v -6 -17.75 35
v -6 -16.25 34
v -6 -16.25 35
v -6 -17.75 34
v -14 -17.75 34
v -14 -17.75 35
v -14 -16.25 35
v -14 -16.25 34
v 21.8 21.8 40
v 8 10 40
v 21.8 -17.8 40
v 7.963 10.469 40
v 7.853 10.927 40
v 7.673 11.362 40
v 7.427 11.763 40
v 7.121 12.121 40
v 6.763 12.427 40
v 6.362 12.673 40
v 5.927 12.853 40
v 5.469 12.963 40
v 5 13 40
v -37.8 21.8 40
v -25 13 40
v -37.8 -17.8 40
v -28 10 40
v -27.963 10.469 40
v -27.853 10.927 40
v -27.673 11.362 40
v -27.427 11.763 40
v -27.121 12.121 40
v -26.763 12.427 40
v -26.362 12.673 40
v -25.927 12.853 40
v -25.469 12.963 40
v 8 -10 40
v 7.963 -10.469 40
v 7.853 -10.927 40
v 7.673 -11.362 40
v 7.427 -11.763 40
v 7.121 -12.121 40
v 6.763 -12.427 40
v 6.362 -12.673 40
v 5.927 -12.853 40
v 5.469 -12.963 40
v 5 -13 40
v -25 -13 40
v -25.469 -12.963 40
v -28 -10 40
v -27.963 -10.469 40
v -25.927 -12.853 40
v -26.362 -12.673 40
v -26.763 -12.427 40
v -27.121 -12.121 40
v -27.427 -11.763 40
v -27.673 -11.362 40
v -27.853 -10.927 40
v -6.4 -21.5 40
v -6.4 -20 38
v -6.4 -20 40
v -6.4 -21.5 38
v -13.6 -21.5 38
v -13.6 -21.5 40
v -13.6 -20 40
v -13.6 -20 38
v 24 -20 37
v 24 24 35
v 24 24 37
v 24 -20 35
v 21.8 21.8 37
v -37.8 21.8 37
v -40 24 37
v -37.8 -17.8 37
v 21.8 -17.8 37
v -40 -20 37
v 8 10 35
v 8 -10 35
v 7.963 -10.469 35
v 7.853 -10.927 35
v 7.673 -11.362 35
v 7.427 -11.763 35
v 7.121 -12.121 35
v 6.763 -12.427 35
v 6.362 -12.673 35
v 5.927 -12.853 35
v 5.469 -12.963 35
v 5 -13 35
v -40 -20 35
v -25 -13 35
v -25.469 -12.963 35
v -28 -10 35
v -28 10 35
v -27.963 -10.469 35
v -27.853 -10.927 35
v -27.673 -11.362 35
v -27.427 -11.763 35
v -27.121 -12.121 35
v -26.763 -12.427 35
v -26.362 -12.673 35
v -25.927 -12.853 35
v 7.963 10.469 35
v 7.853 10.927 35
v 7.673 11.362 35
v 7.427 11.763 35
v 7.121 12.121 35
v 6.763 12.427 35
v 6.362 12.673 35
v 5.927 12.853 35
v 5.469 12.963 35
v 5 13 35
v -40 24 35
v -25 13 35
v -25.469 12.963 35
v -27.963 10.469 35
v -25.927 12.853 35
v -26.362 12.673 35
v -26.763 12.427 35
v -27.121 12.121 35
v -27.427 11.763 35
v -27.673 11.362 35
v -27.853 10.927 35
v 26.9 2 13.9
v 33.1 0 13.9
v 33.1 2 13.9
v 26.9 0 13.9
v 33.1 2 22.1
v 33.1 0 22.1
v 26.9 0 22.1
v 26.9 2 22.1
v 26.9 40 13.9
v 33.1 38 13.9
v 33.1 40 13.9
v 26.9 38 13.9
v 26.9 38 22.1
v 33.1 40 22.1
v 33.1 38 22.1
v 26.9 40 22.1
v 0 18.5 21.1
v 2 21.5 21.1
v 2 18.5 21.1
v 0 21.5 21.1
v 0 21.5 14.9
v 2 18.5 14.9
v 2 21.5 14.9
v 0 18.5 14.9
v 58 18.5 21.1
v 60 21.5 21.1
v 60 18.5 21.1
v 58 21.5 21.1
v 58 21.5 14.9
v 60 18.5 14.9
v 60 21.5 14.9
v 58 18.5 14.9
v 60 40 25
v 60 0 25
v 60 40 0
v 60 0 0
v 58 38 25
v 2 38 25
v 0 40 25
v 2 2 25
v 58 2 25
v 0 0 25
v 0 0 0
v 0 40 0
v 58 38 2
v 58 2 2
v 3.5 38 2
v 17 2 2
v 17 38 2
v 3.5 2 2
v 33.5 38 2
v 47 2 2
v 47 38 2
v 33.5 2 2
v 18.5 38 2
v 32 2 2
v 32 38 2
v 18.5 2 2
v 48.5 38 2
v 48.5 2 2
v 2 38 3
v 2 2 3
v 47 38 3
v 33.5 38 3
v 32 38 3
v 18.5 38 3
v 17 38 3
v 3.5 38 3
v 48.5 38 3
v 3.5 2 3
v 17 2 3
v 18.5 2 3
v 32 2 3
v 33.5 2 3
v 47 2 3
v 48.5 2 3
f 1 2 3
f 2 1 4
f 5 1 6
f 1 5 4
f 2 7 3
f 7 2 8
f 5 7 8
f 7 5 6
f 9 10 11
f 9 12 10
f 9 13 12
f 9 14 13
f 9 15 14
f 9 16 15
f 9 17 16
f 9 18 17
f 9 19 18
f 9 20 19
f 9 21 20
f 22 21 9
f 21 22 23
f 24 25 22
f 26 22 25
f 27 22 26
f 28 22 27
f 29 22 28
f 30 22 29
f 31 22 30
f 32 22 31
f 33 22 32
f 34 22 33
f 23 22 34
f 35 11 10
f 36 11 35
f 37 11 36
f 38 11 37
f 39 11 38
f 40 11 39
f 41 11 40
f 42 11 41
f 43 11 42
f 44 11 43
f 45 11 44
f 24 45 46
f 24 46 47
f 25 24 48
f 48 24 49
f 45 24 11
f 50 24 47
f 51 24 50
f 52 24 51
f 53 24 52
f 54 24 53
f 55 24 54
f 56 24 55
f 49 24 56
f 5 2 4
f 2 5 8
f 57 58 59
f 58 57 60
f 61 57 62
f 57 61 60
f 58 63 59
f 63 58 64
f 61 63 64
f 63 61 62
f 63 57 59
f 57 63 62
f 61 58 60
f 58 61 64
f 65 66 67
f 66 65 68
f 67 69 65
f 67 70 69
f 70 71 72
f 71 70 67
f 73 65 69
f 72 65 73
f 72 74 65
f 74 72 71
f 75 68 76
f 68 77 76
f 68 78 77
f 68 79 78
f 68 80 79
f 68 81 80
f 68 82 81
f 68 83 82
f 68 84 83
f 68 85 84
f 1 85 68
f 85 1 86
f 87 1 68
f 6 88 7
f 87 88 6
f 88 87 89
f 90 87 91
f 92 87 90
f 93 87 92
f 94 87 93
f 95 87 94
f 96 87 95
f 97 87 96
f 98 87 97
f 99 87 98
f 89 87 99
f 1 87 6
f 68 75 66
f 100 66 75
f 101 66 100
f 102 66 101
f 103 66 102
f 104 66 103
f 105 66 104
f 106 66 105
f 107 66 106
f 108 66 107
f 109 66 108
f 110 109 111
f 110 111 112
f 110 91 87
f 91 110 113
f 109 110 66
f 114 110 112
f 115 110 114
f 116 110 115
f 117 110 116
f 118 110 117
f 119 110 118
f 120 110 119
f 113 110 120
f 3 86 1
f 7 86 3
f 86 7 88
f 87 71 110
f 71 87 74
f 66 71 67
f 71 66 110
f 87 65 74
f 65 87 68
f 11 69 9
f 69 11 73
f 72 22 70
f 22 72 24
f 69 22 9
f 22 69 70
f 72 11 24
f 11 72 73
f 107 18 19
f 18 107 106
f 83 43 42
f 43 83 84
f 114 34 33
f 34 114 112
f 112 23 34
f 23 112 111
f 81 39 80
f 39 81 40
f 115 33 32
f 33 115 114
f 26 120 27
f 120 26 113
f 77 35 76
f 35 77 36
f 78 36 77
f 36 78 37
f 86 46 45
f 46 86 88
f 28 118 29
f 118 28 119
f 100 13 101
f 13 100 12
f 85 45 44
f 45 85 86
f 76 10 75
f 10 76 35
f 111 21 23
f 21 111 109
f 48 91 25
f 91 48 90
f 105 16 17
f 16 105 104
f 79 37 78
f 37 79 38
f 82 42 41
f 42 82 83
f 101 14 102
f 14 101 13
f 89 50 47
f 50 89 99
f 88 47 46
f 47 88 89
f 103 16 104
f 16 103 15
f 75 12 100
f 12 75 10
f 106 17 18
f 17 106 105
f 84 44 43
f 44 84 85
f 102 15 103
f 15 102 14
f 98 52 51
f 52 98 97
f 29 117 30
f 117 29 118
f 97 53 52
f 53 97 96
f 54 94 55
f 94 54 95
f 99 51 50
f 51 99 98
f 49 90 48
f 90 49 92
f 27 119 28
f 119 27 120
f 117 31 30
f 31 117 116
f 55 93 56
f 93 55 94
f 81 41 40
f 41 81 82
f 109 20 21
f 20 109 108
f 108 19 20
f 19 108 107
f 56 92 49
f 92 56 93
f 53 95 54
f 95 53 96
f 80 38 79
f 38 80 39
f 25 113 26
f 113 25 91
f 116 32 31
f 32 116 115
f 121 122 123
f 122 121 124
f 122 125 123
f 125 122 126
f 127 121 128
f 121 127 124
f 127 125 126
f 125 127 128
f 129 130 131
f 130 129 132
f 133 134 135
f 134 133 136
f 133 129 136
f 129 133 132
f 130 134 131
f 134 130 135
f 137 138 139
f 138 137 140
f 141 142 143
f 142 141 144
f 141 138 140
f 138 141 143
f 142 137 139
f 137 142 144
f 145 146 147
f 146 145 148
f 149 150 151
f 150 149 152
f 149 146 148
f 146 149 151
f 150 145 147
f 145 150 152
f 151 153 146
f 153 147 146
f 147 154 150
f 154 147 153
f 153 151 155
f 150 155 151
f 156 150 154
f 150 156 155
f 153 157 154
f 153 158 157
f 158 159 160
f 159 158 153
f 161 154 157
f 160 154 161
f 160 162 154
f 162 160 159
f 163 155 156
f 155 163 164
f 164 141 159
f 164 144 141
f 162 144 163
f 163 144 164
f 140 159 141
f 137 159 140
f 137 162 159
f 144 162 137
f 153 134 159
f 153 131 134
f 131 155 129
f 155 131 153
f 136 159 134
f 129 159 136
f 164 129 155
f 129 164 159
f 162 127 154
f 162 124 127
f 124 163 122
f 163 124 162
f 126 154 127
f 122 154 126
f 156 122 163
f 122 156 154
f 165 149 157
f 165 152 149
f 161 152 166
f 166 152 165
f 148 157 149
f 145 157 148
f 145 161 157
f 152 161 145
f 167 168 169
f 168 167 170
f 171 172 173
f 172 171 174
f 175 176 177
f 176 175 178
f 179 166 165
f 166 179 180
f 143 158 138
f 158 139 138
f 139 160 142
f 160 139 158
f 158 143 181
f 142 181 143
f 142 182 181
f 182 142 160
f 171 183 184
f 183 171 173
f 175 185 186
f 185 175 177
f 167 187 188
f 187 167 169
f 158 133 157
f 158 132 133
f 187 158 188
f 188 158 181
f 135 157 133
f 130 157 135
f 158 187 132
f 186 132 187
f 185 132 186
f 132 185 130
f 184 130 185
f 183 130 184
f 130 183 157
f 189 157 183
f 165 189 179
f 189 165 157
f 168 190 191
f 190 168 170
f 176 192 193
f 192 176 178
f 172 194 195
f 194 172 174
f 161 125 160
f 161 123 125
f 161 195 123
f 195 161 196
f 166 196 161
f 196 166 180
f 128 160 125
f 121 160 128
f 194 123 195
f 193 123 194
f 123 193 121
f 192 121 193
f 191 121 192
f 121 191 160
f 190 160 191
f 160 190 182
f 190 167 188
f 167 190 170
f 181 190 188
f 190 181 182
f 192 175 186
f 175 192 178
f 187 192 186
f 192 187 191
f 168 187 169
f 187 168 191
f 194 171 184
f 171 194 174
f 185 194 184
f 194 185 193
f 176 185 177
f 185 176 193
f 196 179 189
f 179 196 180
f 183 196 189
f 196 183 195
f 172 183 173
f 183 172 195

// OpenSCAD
// examples/snap_fit_box.scad
// ==============================================
// 卡扣式盒子 — 无需螺丝的组装设计
// 适合 FDM 打印: 利用塑料弹性实现 snap-fit

$fn = 40;

// ---- 参数 ----
box_width  = 60;
box_depth  = 40;
box_height = 25;
wall       = 2;

// 卡扣参数
snap_width     = 8;
snap_length    = 6;
snap_thickness = 1.5;
snap_overhang  = 1;
snap_taper     = 5;  // 导入斜面角度

tolerance = 0.2;

// ---- 盒体 ----
module snap_box_base() {
    difference() {
        // 外壳
        cube([box_width, box_depth, box_height]);

        // 掏空
        translate([wall, wall, wall])
            cube([box_width - 2 * wall,
                  box_depth - 2 * wall,
                  box_height]);

        // 卡扣槽 (四周各一个)
        snap_positions = [
            [box_width / 2, wall / 2, box_height - snap_length - 1],
            [box_width / 2, box_depth - wall / 2, box_height - snap_length - 1],
            [wall / 2, box_depth / 2, box_height - snap_length - 1],
            [box_width - wall / 2, box_depth / 2, box_height - snap_length - 1],
        ];

        for (pos = snap_positions) {
            translate(pos)
                rotate([
                    (pos[0] < wall ? 0 : 0),
                    (pos[1] < wall ? 90 : (pos[1] > box_depth - wall ? -90 : 0)),
                    0
                ])
                    cube([snap_width + tolerance, wall + 1,
                          snap_length + tolerance], center = true);
        }
    }

    // 底部加强筋
    for (x = [wall : 15 : box_width - wall]) {
        translate([x, wall, wall])
            cube([1.5, box_depth - 2 * wall, 1]);
    }
}

// ---- 盖子 ----
module snap_box_lid() {
    lip_height = 3;

    difference() {
        union() {
            // 盖板
            cube([box_width + 2 * wall, box_depth + 2 * wall, wall]);

            // 配合唇边
            translate([wall + tolerance, wall + tolerance, wall])
                cube([box_width - 2 * tolerance,
                      box_depth - 2 * tolerance,
                      lip_height]);

            // 卡扣
            snap_positions = [
                [box_width / 2, 0, wall],
                [box_width / 2, box_depth, wall],
                [0, box_depth / 2, wall],
                [box_width, box_depth / 2, wall],
            ];

            for (pos = snap_positions) {
                translate([pos[0], pos[1], pos[2]])
                    snap_hook(pos[0], pos[1]);
            }
        }

        // 装饰槽
        translate([box_width / 2, box_depth / 2, -1])
            linear_extrude(height = wall + lip_height + 2)
                offset(r = 3)
                    square([box_width * 0.5, box_depth * 0.5],
                           center = true);
    }

    // 卡扣钩子
    module snap_hook(x, y) {
        // 判断方向
        if (y < wall) {
            // 前侧卡扣
            rotate([90, 0, 0]) {
                translate([0, 0, -snap_length / 2])
                    cube([snap_width, snap_length, snap_thickness],
                         center = true);
                // 钩头
                translate([0, snap_length / 2 - snap_overhang ,
                            snap_thickness / 2])
                    cube([snap_width - tolerance * 4,
                          snap_overhang * 2, snap_thickness],
                         center = true);
            }
        } else if (y > box_depth) {
            // 后侧卡扣
            rotate([-90, 0, 0]) {
                translate([0, 0, -snap_length / 2])
                    cube([snap_width, snap_length, snap_thickness],
                         center = true);
                translate([0, snap_length / 2 - snap_overhang,
                            snap_thickness / 2])
                    cube([snap_width - tolerance * 4,
                          snap_overhang * 2, snap_thickness],
                         center = true);
            }
        }
    }
}

// ---- 展示 ----
translate([-box_width / 2 - 10, -box_depth / 2, box_height + 10])
    snap_box_lid();

snap_box_base();
